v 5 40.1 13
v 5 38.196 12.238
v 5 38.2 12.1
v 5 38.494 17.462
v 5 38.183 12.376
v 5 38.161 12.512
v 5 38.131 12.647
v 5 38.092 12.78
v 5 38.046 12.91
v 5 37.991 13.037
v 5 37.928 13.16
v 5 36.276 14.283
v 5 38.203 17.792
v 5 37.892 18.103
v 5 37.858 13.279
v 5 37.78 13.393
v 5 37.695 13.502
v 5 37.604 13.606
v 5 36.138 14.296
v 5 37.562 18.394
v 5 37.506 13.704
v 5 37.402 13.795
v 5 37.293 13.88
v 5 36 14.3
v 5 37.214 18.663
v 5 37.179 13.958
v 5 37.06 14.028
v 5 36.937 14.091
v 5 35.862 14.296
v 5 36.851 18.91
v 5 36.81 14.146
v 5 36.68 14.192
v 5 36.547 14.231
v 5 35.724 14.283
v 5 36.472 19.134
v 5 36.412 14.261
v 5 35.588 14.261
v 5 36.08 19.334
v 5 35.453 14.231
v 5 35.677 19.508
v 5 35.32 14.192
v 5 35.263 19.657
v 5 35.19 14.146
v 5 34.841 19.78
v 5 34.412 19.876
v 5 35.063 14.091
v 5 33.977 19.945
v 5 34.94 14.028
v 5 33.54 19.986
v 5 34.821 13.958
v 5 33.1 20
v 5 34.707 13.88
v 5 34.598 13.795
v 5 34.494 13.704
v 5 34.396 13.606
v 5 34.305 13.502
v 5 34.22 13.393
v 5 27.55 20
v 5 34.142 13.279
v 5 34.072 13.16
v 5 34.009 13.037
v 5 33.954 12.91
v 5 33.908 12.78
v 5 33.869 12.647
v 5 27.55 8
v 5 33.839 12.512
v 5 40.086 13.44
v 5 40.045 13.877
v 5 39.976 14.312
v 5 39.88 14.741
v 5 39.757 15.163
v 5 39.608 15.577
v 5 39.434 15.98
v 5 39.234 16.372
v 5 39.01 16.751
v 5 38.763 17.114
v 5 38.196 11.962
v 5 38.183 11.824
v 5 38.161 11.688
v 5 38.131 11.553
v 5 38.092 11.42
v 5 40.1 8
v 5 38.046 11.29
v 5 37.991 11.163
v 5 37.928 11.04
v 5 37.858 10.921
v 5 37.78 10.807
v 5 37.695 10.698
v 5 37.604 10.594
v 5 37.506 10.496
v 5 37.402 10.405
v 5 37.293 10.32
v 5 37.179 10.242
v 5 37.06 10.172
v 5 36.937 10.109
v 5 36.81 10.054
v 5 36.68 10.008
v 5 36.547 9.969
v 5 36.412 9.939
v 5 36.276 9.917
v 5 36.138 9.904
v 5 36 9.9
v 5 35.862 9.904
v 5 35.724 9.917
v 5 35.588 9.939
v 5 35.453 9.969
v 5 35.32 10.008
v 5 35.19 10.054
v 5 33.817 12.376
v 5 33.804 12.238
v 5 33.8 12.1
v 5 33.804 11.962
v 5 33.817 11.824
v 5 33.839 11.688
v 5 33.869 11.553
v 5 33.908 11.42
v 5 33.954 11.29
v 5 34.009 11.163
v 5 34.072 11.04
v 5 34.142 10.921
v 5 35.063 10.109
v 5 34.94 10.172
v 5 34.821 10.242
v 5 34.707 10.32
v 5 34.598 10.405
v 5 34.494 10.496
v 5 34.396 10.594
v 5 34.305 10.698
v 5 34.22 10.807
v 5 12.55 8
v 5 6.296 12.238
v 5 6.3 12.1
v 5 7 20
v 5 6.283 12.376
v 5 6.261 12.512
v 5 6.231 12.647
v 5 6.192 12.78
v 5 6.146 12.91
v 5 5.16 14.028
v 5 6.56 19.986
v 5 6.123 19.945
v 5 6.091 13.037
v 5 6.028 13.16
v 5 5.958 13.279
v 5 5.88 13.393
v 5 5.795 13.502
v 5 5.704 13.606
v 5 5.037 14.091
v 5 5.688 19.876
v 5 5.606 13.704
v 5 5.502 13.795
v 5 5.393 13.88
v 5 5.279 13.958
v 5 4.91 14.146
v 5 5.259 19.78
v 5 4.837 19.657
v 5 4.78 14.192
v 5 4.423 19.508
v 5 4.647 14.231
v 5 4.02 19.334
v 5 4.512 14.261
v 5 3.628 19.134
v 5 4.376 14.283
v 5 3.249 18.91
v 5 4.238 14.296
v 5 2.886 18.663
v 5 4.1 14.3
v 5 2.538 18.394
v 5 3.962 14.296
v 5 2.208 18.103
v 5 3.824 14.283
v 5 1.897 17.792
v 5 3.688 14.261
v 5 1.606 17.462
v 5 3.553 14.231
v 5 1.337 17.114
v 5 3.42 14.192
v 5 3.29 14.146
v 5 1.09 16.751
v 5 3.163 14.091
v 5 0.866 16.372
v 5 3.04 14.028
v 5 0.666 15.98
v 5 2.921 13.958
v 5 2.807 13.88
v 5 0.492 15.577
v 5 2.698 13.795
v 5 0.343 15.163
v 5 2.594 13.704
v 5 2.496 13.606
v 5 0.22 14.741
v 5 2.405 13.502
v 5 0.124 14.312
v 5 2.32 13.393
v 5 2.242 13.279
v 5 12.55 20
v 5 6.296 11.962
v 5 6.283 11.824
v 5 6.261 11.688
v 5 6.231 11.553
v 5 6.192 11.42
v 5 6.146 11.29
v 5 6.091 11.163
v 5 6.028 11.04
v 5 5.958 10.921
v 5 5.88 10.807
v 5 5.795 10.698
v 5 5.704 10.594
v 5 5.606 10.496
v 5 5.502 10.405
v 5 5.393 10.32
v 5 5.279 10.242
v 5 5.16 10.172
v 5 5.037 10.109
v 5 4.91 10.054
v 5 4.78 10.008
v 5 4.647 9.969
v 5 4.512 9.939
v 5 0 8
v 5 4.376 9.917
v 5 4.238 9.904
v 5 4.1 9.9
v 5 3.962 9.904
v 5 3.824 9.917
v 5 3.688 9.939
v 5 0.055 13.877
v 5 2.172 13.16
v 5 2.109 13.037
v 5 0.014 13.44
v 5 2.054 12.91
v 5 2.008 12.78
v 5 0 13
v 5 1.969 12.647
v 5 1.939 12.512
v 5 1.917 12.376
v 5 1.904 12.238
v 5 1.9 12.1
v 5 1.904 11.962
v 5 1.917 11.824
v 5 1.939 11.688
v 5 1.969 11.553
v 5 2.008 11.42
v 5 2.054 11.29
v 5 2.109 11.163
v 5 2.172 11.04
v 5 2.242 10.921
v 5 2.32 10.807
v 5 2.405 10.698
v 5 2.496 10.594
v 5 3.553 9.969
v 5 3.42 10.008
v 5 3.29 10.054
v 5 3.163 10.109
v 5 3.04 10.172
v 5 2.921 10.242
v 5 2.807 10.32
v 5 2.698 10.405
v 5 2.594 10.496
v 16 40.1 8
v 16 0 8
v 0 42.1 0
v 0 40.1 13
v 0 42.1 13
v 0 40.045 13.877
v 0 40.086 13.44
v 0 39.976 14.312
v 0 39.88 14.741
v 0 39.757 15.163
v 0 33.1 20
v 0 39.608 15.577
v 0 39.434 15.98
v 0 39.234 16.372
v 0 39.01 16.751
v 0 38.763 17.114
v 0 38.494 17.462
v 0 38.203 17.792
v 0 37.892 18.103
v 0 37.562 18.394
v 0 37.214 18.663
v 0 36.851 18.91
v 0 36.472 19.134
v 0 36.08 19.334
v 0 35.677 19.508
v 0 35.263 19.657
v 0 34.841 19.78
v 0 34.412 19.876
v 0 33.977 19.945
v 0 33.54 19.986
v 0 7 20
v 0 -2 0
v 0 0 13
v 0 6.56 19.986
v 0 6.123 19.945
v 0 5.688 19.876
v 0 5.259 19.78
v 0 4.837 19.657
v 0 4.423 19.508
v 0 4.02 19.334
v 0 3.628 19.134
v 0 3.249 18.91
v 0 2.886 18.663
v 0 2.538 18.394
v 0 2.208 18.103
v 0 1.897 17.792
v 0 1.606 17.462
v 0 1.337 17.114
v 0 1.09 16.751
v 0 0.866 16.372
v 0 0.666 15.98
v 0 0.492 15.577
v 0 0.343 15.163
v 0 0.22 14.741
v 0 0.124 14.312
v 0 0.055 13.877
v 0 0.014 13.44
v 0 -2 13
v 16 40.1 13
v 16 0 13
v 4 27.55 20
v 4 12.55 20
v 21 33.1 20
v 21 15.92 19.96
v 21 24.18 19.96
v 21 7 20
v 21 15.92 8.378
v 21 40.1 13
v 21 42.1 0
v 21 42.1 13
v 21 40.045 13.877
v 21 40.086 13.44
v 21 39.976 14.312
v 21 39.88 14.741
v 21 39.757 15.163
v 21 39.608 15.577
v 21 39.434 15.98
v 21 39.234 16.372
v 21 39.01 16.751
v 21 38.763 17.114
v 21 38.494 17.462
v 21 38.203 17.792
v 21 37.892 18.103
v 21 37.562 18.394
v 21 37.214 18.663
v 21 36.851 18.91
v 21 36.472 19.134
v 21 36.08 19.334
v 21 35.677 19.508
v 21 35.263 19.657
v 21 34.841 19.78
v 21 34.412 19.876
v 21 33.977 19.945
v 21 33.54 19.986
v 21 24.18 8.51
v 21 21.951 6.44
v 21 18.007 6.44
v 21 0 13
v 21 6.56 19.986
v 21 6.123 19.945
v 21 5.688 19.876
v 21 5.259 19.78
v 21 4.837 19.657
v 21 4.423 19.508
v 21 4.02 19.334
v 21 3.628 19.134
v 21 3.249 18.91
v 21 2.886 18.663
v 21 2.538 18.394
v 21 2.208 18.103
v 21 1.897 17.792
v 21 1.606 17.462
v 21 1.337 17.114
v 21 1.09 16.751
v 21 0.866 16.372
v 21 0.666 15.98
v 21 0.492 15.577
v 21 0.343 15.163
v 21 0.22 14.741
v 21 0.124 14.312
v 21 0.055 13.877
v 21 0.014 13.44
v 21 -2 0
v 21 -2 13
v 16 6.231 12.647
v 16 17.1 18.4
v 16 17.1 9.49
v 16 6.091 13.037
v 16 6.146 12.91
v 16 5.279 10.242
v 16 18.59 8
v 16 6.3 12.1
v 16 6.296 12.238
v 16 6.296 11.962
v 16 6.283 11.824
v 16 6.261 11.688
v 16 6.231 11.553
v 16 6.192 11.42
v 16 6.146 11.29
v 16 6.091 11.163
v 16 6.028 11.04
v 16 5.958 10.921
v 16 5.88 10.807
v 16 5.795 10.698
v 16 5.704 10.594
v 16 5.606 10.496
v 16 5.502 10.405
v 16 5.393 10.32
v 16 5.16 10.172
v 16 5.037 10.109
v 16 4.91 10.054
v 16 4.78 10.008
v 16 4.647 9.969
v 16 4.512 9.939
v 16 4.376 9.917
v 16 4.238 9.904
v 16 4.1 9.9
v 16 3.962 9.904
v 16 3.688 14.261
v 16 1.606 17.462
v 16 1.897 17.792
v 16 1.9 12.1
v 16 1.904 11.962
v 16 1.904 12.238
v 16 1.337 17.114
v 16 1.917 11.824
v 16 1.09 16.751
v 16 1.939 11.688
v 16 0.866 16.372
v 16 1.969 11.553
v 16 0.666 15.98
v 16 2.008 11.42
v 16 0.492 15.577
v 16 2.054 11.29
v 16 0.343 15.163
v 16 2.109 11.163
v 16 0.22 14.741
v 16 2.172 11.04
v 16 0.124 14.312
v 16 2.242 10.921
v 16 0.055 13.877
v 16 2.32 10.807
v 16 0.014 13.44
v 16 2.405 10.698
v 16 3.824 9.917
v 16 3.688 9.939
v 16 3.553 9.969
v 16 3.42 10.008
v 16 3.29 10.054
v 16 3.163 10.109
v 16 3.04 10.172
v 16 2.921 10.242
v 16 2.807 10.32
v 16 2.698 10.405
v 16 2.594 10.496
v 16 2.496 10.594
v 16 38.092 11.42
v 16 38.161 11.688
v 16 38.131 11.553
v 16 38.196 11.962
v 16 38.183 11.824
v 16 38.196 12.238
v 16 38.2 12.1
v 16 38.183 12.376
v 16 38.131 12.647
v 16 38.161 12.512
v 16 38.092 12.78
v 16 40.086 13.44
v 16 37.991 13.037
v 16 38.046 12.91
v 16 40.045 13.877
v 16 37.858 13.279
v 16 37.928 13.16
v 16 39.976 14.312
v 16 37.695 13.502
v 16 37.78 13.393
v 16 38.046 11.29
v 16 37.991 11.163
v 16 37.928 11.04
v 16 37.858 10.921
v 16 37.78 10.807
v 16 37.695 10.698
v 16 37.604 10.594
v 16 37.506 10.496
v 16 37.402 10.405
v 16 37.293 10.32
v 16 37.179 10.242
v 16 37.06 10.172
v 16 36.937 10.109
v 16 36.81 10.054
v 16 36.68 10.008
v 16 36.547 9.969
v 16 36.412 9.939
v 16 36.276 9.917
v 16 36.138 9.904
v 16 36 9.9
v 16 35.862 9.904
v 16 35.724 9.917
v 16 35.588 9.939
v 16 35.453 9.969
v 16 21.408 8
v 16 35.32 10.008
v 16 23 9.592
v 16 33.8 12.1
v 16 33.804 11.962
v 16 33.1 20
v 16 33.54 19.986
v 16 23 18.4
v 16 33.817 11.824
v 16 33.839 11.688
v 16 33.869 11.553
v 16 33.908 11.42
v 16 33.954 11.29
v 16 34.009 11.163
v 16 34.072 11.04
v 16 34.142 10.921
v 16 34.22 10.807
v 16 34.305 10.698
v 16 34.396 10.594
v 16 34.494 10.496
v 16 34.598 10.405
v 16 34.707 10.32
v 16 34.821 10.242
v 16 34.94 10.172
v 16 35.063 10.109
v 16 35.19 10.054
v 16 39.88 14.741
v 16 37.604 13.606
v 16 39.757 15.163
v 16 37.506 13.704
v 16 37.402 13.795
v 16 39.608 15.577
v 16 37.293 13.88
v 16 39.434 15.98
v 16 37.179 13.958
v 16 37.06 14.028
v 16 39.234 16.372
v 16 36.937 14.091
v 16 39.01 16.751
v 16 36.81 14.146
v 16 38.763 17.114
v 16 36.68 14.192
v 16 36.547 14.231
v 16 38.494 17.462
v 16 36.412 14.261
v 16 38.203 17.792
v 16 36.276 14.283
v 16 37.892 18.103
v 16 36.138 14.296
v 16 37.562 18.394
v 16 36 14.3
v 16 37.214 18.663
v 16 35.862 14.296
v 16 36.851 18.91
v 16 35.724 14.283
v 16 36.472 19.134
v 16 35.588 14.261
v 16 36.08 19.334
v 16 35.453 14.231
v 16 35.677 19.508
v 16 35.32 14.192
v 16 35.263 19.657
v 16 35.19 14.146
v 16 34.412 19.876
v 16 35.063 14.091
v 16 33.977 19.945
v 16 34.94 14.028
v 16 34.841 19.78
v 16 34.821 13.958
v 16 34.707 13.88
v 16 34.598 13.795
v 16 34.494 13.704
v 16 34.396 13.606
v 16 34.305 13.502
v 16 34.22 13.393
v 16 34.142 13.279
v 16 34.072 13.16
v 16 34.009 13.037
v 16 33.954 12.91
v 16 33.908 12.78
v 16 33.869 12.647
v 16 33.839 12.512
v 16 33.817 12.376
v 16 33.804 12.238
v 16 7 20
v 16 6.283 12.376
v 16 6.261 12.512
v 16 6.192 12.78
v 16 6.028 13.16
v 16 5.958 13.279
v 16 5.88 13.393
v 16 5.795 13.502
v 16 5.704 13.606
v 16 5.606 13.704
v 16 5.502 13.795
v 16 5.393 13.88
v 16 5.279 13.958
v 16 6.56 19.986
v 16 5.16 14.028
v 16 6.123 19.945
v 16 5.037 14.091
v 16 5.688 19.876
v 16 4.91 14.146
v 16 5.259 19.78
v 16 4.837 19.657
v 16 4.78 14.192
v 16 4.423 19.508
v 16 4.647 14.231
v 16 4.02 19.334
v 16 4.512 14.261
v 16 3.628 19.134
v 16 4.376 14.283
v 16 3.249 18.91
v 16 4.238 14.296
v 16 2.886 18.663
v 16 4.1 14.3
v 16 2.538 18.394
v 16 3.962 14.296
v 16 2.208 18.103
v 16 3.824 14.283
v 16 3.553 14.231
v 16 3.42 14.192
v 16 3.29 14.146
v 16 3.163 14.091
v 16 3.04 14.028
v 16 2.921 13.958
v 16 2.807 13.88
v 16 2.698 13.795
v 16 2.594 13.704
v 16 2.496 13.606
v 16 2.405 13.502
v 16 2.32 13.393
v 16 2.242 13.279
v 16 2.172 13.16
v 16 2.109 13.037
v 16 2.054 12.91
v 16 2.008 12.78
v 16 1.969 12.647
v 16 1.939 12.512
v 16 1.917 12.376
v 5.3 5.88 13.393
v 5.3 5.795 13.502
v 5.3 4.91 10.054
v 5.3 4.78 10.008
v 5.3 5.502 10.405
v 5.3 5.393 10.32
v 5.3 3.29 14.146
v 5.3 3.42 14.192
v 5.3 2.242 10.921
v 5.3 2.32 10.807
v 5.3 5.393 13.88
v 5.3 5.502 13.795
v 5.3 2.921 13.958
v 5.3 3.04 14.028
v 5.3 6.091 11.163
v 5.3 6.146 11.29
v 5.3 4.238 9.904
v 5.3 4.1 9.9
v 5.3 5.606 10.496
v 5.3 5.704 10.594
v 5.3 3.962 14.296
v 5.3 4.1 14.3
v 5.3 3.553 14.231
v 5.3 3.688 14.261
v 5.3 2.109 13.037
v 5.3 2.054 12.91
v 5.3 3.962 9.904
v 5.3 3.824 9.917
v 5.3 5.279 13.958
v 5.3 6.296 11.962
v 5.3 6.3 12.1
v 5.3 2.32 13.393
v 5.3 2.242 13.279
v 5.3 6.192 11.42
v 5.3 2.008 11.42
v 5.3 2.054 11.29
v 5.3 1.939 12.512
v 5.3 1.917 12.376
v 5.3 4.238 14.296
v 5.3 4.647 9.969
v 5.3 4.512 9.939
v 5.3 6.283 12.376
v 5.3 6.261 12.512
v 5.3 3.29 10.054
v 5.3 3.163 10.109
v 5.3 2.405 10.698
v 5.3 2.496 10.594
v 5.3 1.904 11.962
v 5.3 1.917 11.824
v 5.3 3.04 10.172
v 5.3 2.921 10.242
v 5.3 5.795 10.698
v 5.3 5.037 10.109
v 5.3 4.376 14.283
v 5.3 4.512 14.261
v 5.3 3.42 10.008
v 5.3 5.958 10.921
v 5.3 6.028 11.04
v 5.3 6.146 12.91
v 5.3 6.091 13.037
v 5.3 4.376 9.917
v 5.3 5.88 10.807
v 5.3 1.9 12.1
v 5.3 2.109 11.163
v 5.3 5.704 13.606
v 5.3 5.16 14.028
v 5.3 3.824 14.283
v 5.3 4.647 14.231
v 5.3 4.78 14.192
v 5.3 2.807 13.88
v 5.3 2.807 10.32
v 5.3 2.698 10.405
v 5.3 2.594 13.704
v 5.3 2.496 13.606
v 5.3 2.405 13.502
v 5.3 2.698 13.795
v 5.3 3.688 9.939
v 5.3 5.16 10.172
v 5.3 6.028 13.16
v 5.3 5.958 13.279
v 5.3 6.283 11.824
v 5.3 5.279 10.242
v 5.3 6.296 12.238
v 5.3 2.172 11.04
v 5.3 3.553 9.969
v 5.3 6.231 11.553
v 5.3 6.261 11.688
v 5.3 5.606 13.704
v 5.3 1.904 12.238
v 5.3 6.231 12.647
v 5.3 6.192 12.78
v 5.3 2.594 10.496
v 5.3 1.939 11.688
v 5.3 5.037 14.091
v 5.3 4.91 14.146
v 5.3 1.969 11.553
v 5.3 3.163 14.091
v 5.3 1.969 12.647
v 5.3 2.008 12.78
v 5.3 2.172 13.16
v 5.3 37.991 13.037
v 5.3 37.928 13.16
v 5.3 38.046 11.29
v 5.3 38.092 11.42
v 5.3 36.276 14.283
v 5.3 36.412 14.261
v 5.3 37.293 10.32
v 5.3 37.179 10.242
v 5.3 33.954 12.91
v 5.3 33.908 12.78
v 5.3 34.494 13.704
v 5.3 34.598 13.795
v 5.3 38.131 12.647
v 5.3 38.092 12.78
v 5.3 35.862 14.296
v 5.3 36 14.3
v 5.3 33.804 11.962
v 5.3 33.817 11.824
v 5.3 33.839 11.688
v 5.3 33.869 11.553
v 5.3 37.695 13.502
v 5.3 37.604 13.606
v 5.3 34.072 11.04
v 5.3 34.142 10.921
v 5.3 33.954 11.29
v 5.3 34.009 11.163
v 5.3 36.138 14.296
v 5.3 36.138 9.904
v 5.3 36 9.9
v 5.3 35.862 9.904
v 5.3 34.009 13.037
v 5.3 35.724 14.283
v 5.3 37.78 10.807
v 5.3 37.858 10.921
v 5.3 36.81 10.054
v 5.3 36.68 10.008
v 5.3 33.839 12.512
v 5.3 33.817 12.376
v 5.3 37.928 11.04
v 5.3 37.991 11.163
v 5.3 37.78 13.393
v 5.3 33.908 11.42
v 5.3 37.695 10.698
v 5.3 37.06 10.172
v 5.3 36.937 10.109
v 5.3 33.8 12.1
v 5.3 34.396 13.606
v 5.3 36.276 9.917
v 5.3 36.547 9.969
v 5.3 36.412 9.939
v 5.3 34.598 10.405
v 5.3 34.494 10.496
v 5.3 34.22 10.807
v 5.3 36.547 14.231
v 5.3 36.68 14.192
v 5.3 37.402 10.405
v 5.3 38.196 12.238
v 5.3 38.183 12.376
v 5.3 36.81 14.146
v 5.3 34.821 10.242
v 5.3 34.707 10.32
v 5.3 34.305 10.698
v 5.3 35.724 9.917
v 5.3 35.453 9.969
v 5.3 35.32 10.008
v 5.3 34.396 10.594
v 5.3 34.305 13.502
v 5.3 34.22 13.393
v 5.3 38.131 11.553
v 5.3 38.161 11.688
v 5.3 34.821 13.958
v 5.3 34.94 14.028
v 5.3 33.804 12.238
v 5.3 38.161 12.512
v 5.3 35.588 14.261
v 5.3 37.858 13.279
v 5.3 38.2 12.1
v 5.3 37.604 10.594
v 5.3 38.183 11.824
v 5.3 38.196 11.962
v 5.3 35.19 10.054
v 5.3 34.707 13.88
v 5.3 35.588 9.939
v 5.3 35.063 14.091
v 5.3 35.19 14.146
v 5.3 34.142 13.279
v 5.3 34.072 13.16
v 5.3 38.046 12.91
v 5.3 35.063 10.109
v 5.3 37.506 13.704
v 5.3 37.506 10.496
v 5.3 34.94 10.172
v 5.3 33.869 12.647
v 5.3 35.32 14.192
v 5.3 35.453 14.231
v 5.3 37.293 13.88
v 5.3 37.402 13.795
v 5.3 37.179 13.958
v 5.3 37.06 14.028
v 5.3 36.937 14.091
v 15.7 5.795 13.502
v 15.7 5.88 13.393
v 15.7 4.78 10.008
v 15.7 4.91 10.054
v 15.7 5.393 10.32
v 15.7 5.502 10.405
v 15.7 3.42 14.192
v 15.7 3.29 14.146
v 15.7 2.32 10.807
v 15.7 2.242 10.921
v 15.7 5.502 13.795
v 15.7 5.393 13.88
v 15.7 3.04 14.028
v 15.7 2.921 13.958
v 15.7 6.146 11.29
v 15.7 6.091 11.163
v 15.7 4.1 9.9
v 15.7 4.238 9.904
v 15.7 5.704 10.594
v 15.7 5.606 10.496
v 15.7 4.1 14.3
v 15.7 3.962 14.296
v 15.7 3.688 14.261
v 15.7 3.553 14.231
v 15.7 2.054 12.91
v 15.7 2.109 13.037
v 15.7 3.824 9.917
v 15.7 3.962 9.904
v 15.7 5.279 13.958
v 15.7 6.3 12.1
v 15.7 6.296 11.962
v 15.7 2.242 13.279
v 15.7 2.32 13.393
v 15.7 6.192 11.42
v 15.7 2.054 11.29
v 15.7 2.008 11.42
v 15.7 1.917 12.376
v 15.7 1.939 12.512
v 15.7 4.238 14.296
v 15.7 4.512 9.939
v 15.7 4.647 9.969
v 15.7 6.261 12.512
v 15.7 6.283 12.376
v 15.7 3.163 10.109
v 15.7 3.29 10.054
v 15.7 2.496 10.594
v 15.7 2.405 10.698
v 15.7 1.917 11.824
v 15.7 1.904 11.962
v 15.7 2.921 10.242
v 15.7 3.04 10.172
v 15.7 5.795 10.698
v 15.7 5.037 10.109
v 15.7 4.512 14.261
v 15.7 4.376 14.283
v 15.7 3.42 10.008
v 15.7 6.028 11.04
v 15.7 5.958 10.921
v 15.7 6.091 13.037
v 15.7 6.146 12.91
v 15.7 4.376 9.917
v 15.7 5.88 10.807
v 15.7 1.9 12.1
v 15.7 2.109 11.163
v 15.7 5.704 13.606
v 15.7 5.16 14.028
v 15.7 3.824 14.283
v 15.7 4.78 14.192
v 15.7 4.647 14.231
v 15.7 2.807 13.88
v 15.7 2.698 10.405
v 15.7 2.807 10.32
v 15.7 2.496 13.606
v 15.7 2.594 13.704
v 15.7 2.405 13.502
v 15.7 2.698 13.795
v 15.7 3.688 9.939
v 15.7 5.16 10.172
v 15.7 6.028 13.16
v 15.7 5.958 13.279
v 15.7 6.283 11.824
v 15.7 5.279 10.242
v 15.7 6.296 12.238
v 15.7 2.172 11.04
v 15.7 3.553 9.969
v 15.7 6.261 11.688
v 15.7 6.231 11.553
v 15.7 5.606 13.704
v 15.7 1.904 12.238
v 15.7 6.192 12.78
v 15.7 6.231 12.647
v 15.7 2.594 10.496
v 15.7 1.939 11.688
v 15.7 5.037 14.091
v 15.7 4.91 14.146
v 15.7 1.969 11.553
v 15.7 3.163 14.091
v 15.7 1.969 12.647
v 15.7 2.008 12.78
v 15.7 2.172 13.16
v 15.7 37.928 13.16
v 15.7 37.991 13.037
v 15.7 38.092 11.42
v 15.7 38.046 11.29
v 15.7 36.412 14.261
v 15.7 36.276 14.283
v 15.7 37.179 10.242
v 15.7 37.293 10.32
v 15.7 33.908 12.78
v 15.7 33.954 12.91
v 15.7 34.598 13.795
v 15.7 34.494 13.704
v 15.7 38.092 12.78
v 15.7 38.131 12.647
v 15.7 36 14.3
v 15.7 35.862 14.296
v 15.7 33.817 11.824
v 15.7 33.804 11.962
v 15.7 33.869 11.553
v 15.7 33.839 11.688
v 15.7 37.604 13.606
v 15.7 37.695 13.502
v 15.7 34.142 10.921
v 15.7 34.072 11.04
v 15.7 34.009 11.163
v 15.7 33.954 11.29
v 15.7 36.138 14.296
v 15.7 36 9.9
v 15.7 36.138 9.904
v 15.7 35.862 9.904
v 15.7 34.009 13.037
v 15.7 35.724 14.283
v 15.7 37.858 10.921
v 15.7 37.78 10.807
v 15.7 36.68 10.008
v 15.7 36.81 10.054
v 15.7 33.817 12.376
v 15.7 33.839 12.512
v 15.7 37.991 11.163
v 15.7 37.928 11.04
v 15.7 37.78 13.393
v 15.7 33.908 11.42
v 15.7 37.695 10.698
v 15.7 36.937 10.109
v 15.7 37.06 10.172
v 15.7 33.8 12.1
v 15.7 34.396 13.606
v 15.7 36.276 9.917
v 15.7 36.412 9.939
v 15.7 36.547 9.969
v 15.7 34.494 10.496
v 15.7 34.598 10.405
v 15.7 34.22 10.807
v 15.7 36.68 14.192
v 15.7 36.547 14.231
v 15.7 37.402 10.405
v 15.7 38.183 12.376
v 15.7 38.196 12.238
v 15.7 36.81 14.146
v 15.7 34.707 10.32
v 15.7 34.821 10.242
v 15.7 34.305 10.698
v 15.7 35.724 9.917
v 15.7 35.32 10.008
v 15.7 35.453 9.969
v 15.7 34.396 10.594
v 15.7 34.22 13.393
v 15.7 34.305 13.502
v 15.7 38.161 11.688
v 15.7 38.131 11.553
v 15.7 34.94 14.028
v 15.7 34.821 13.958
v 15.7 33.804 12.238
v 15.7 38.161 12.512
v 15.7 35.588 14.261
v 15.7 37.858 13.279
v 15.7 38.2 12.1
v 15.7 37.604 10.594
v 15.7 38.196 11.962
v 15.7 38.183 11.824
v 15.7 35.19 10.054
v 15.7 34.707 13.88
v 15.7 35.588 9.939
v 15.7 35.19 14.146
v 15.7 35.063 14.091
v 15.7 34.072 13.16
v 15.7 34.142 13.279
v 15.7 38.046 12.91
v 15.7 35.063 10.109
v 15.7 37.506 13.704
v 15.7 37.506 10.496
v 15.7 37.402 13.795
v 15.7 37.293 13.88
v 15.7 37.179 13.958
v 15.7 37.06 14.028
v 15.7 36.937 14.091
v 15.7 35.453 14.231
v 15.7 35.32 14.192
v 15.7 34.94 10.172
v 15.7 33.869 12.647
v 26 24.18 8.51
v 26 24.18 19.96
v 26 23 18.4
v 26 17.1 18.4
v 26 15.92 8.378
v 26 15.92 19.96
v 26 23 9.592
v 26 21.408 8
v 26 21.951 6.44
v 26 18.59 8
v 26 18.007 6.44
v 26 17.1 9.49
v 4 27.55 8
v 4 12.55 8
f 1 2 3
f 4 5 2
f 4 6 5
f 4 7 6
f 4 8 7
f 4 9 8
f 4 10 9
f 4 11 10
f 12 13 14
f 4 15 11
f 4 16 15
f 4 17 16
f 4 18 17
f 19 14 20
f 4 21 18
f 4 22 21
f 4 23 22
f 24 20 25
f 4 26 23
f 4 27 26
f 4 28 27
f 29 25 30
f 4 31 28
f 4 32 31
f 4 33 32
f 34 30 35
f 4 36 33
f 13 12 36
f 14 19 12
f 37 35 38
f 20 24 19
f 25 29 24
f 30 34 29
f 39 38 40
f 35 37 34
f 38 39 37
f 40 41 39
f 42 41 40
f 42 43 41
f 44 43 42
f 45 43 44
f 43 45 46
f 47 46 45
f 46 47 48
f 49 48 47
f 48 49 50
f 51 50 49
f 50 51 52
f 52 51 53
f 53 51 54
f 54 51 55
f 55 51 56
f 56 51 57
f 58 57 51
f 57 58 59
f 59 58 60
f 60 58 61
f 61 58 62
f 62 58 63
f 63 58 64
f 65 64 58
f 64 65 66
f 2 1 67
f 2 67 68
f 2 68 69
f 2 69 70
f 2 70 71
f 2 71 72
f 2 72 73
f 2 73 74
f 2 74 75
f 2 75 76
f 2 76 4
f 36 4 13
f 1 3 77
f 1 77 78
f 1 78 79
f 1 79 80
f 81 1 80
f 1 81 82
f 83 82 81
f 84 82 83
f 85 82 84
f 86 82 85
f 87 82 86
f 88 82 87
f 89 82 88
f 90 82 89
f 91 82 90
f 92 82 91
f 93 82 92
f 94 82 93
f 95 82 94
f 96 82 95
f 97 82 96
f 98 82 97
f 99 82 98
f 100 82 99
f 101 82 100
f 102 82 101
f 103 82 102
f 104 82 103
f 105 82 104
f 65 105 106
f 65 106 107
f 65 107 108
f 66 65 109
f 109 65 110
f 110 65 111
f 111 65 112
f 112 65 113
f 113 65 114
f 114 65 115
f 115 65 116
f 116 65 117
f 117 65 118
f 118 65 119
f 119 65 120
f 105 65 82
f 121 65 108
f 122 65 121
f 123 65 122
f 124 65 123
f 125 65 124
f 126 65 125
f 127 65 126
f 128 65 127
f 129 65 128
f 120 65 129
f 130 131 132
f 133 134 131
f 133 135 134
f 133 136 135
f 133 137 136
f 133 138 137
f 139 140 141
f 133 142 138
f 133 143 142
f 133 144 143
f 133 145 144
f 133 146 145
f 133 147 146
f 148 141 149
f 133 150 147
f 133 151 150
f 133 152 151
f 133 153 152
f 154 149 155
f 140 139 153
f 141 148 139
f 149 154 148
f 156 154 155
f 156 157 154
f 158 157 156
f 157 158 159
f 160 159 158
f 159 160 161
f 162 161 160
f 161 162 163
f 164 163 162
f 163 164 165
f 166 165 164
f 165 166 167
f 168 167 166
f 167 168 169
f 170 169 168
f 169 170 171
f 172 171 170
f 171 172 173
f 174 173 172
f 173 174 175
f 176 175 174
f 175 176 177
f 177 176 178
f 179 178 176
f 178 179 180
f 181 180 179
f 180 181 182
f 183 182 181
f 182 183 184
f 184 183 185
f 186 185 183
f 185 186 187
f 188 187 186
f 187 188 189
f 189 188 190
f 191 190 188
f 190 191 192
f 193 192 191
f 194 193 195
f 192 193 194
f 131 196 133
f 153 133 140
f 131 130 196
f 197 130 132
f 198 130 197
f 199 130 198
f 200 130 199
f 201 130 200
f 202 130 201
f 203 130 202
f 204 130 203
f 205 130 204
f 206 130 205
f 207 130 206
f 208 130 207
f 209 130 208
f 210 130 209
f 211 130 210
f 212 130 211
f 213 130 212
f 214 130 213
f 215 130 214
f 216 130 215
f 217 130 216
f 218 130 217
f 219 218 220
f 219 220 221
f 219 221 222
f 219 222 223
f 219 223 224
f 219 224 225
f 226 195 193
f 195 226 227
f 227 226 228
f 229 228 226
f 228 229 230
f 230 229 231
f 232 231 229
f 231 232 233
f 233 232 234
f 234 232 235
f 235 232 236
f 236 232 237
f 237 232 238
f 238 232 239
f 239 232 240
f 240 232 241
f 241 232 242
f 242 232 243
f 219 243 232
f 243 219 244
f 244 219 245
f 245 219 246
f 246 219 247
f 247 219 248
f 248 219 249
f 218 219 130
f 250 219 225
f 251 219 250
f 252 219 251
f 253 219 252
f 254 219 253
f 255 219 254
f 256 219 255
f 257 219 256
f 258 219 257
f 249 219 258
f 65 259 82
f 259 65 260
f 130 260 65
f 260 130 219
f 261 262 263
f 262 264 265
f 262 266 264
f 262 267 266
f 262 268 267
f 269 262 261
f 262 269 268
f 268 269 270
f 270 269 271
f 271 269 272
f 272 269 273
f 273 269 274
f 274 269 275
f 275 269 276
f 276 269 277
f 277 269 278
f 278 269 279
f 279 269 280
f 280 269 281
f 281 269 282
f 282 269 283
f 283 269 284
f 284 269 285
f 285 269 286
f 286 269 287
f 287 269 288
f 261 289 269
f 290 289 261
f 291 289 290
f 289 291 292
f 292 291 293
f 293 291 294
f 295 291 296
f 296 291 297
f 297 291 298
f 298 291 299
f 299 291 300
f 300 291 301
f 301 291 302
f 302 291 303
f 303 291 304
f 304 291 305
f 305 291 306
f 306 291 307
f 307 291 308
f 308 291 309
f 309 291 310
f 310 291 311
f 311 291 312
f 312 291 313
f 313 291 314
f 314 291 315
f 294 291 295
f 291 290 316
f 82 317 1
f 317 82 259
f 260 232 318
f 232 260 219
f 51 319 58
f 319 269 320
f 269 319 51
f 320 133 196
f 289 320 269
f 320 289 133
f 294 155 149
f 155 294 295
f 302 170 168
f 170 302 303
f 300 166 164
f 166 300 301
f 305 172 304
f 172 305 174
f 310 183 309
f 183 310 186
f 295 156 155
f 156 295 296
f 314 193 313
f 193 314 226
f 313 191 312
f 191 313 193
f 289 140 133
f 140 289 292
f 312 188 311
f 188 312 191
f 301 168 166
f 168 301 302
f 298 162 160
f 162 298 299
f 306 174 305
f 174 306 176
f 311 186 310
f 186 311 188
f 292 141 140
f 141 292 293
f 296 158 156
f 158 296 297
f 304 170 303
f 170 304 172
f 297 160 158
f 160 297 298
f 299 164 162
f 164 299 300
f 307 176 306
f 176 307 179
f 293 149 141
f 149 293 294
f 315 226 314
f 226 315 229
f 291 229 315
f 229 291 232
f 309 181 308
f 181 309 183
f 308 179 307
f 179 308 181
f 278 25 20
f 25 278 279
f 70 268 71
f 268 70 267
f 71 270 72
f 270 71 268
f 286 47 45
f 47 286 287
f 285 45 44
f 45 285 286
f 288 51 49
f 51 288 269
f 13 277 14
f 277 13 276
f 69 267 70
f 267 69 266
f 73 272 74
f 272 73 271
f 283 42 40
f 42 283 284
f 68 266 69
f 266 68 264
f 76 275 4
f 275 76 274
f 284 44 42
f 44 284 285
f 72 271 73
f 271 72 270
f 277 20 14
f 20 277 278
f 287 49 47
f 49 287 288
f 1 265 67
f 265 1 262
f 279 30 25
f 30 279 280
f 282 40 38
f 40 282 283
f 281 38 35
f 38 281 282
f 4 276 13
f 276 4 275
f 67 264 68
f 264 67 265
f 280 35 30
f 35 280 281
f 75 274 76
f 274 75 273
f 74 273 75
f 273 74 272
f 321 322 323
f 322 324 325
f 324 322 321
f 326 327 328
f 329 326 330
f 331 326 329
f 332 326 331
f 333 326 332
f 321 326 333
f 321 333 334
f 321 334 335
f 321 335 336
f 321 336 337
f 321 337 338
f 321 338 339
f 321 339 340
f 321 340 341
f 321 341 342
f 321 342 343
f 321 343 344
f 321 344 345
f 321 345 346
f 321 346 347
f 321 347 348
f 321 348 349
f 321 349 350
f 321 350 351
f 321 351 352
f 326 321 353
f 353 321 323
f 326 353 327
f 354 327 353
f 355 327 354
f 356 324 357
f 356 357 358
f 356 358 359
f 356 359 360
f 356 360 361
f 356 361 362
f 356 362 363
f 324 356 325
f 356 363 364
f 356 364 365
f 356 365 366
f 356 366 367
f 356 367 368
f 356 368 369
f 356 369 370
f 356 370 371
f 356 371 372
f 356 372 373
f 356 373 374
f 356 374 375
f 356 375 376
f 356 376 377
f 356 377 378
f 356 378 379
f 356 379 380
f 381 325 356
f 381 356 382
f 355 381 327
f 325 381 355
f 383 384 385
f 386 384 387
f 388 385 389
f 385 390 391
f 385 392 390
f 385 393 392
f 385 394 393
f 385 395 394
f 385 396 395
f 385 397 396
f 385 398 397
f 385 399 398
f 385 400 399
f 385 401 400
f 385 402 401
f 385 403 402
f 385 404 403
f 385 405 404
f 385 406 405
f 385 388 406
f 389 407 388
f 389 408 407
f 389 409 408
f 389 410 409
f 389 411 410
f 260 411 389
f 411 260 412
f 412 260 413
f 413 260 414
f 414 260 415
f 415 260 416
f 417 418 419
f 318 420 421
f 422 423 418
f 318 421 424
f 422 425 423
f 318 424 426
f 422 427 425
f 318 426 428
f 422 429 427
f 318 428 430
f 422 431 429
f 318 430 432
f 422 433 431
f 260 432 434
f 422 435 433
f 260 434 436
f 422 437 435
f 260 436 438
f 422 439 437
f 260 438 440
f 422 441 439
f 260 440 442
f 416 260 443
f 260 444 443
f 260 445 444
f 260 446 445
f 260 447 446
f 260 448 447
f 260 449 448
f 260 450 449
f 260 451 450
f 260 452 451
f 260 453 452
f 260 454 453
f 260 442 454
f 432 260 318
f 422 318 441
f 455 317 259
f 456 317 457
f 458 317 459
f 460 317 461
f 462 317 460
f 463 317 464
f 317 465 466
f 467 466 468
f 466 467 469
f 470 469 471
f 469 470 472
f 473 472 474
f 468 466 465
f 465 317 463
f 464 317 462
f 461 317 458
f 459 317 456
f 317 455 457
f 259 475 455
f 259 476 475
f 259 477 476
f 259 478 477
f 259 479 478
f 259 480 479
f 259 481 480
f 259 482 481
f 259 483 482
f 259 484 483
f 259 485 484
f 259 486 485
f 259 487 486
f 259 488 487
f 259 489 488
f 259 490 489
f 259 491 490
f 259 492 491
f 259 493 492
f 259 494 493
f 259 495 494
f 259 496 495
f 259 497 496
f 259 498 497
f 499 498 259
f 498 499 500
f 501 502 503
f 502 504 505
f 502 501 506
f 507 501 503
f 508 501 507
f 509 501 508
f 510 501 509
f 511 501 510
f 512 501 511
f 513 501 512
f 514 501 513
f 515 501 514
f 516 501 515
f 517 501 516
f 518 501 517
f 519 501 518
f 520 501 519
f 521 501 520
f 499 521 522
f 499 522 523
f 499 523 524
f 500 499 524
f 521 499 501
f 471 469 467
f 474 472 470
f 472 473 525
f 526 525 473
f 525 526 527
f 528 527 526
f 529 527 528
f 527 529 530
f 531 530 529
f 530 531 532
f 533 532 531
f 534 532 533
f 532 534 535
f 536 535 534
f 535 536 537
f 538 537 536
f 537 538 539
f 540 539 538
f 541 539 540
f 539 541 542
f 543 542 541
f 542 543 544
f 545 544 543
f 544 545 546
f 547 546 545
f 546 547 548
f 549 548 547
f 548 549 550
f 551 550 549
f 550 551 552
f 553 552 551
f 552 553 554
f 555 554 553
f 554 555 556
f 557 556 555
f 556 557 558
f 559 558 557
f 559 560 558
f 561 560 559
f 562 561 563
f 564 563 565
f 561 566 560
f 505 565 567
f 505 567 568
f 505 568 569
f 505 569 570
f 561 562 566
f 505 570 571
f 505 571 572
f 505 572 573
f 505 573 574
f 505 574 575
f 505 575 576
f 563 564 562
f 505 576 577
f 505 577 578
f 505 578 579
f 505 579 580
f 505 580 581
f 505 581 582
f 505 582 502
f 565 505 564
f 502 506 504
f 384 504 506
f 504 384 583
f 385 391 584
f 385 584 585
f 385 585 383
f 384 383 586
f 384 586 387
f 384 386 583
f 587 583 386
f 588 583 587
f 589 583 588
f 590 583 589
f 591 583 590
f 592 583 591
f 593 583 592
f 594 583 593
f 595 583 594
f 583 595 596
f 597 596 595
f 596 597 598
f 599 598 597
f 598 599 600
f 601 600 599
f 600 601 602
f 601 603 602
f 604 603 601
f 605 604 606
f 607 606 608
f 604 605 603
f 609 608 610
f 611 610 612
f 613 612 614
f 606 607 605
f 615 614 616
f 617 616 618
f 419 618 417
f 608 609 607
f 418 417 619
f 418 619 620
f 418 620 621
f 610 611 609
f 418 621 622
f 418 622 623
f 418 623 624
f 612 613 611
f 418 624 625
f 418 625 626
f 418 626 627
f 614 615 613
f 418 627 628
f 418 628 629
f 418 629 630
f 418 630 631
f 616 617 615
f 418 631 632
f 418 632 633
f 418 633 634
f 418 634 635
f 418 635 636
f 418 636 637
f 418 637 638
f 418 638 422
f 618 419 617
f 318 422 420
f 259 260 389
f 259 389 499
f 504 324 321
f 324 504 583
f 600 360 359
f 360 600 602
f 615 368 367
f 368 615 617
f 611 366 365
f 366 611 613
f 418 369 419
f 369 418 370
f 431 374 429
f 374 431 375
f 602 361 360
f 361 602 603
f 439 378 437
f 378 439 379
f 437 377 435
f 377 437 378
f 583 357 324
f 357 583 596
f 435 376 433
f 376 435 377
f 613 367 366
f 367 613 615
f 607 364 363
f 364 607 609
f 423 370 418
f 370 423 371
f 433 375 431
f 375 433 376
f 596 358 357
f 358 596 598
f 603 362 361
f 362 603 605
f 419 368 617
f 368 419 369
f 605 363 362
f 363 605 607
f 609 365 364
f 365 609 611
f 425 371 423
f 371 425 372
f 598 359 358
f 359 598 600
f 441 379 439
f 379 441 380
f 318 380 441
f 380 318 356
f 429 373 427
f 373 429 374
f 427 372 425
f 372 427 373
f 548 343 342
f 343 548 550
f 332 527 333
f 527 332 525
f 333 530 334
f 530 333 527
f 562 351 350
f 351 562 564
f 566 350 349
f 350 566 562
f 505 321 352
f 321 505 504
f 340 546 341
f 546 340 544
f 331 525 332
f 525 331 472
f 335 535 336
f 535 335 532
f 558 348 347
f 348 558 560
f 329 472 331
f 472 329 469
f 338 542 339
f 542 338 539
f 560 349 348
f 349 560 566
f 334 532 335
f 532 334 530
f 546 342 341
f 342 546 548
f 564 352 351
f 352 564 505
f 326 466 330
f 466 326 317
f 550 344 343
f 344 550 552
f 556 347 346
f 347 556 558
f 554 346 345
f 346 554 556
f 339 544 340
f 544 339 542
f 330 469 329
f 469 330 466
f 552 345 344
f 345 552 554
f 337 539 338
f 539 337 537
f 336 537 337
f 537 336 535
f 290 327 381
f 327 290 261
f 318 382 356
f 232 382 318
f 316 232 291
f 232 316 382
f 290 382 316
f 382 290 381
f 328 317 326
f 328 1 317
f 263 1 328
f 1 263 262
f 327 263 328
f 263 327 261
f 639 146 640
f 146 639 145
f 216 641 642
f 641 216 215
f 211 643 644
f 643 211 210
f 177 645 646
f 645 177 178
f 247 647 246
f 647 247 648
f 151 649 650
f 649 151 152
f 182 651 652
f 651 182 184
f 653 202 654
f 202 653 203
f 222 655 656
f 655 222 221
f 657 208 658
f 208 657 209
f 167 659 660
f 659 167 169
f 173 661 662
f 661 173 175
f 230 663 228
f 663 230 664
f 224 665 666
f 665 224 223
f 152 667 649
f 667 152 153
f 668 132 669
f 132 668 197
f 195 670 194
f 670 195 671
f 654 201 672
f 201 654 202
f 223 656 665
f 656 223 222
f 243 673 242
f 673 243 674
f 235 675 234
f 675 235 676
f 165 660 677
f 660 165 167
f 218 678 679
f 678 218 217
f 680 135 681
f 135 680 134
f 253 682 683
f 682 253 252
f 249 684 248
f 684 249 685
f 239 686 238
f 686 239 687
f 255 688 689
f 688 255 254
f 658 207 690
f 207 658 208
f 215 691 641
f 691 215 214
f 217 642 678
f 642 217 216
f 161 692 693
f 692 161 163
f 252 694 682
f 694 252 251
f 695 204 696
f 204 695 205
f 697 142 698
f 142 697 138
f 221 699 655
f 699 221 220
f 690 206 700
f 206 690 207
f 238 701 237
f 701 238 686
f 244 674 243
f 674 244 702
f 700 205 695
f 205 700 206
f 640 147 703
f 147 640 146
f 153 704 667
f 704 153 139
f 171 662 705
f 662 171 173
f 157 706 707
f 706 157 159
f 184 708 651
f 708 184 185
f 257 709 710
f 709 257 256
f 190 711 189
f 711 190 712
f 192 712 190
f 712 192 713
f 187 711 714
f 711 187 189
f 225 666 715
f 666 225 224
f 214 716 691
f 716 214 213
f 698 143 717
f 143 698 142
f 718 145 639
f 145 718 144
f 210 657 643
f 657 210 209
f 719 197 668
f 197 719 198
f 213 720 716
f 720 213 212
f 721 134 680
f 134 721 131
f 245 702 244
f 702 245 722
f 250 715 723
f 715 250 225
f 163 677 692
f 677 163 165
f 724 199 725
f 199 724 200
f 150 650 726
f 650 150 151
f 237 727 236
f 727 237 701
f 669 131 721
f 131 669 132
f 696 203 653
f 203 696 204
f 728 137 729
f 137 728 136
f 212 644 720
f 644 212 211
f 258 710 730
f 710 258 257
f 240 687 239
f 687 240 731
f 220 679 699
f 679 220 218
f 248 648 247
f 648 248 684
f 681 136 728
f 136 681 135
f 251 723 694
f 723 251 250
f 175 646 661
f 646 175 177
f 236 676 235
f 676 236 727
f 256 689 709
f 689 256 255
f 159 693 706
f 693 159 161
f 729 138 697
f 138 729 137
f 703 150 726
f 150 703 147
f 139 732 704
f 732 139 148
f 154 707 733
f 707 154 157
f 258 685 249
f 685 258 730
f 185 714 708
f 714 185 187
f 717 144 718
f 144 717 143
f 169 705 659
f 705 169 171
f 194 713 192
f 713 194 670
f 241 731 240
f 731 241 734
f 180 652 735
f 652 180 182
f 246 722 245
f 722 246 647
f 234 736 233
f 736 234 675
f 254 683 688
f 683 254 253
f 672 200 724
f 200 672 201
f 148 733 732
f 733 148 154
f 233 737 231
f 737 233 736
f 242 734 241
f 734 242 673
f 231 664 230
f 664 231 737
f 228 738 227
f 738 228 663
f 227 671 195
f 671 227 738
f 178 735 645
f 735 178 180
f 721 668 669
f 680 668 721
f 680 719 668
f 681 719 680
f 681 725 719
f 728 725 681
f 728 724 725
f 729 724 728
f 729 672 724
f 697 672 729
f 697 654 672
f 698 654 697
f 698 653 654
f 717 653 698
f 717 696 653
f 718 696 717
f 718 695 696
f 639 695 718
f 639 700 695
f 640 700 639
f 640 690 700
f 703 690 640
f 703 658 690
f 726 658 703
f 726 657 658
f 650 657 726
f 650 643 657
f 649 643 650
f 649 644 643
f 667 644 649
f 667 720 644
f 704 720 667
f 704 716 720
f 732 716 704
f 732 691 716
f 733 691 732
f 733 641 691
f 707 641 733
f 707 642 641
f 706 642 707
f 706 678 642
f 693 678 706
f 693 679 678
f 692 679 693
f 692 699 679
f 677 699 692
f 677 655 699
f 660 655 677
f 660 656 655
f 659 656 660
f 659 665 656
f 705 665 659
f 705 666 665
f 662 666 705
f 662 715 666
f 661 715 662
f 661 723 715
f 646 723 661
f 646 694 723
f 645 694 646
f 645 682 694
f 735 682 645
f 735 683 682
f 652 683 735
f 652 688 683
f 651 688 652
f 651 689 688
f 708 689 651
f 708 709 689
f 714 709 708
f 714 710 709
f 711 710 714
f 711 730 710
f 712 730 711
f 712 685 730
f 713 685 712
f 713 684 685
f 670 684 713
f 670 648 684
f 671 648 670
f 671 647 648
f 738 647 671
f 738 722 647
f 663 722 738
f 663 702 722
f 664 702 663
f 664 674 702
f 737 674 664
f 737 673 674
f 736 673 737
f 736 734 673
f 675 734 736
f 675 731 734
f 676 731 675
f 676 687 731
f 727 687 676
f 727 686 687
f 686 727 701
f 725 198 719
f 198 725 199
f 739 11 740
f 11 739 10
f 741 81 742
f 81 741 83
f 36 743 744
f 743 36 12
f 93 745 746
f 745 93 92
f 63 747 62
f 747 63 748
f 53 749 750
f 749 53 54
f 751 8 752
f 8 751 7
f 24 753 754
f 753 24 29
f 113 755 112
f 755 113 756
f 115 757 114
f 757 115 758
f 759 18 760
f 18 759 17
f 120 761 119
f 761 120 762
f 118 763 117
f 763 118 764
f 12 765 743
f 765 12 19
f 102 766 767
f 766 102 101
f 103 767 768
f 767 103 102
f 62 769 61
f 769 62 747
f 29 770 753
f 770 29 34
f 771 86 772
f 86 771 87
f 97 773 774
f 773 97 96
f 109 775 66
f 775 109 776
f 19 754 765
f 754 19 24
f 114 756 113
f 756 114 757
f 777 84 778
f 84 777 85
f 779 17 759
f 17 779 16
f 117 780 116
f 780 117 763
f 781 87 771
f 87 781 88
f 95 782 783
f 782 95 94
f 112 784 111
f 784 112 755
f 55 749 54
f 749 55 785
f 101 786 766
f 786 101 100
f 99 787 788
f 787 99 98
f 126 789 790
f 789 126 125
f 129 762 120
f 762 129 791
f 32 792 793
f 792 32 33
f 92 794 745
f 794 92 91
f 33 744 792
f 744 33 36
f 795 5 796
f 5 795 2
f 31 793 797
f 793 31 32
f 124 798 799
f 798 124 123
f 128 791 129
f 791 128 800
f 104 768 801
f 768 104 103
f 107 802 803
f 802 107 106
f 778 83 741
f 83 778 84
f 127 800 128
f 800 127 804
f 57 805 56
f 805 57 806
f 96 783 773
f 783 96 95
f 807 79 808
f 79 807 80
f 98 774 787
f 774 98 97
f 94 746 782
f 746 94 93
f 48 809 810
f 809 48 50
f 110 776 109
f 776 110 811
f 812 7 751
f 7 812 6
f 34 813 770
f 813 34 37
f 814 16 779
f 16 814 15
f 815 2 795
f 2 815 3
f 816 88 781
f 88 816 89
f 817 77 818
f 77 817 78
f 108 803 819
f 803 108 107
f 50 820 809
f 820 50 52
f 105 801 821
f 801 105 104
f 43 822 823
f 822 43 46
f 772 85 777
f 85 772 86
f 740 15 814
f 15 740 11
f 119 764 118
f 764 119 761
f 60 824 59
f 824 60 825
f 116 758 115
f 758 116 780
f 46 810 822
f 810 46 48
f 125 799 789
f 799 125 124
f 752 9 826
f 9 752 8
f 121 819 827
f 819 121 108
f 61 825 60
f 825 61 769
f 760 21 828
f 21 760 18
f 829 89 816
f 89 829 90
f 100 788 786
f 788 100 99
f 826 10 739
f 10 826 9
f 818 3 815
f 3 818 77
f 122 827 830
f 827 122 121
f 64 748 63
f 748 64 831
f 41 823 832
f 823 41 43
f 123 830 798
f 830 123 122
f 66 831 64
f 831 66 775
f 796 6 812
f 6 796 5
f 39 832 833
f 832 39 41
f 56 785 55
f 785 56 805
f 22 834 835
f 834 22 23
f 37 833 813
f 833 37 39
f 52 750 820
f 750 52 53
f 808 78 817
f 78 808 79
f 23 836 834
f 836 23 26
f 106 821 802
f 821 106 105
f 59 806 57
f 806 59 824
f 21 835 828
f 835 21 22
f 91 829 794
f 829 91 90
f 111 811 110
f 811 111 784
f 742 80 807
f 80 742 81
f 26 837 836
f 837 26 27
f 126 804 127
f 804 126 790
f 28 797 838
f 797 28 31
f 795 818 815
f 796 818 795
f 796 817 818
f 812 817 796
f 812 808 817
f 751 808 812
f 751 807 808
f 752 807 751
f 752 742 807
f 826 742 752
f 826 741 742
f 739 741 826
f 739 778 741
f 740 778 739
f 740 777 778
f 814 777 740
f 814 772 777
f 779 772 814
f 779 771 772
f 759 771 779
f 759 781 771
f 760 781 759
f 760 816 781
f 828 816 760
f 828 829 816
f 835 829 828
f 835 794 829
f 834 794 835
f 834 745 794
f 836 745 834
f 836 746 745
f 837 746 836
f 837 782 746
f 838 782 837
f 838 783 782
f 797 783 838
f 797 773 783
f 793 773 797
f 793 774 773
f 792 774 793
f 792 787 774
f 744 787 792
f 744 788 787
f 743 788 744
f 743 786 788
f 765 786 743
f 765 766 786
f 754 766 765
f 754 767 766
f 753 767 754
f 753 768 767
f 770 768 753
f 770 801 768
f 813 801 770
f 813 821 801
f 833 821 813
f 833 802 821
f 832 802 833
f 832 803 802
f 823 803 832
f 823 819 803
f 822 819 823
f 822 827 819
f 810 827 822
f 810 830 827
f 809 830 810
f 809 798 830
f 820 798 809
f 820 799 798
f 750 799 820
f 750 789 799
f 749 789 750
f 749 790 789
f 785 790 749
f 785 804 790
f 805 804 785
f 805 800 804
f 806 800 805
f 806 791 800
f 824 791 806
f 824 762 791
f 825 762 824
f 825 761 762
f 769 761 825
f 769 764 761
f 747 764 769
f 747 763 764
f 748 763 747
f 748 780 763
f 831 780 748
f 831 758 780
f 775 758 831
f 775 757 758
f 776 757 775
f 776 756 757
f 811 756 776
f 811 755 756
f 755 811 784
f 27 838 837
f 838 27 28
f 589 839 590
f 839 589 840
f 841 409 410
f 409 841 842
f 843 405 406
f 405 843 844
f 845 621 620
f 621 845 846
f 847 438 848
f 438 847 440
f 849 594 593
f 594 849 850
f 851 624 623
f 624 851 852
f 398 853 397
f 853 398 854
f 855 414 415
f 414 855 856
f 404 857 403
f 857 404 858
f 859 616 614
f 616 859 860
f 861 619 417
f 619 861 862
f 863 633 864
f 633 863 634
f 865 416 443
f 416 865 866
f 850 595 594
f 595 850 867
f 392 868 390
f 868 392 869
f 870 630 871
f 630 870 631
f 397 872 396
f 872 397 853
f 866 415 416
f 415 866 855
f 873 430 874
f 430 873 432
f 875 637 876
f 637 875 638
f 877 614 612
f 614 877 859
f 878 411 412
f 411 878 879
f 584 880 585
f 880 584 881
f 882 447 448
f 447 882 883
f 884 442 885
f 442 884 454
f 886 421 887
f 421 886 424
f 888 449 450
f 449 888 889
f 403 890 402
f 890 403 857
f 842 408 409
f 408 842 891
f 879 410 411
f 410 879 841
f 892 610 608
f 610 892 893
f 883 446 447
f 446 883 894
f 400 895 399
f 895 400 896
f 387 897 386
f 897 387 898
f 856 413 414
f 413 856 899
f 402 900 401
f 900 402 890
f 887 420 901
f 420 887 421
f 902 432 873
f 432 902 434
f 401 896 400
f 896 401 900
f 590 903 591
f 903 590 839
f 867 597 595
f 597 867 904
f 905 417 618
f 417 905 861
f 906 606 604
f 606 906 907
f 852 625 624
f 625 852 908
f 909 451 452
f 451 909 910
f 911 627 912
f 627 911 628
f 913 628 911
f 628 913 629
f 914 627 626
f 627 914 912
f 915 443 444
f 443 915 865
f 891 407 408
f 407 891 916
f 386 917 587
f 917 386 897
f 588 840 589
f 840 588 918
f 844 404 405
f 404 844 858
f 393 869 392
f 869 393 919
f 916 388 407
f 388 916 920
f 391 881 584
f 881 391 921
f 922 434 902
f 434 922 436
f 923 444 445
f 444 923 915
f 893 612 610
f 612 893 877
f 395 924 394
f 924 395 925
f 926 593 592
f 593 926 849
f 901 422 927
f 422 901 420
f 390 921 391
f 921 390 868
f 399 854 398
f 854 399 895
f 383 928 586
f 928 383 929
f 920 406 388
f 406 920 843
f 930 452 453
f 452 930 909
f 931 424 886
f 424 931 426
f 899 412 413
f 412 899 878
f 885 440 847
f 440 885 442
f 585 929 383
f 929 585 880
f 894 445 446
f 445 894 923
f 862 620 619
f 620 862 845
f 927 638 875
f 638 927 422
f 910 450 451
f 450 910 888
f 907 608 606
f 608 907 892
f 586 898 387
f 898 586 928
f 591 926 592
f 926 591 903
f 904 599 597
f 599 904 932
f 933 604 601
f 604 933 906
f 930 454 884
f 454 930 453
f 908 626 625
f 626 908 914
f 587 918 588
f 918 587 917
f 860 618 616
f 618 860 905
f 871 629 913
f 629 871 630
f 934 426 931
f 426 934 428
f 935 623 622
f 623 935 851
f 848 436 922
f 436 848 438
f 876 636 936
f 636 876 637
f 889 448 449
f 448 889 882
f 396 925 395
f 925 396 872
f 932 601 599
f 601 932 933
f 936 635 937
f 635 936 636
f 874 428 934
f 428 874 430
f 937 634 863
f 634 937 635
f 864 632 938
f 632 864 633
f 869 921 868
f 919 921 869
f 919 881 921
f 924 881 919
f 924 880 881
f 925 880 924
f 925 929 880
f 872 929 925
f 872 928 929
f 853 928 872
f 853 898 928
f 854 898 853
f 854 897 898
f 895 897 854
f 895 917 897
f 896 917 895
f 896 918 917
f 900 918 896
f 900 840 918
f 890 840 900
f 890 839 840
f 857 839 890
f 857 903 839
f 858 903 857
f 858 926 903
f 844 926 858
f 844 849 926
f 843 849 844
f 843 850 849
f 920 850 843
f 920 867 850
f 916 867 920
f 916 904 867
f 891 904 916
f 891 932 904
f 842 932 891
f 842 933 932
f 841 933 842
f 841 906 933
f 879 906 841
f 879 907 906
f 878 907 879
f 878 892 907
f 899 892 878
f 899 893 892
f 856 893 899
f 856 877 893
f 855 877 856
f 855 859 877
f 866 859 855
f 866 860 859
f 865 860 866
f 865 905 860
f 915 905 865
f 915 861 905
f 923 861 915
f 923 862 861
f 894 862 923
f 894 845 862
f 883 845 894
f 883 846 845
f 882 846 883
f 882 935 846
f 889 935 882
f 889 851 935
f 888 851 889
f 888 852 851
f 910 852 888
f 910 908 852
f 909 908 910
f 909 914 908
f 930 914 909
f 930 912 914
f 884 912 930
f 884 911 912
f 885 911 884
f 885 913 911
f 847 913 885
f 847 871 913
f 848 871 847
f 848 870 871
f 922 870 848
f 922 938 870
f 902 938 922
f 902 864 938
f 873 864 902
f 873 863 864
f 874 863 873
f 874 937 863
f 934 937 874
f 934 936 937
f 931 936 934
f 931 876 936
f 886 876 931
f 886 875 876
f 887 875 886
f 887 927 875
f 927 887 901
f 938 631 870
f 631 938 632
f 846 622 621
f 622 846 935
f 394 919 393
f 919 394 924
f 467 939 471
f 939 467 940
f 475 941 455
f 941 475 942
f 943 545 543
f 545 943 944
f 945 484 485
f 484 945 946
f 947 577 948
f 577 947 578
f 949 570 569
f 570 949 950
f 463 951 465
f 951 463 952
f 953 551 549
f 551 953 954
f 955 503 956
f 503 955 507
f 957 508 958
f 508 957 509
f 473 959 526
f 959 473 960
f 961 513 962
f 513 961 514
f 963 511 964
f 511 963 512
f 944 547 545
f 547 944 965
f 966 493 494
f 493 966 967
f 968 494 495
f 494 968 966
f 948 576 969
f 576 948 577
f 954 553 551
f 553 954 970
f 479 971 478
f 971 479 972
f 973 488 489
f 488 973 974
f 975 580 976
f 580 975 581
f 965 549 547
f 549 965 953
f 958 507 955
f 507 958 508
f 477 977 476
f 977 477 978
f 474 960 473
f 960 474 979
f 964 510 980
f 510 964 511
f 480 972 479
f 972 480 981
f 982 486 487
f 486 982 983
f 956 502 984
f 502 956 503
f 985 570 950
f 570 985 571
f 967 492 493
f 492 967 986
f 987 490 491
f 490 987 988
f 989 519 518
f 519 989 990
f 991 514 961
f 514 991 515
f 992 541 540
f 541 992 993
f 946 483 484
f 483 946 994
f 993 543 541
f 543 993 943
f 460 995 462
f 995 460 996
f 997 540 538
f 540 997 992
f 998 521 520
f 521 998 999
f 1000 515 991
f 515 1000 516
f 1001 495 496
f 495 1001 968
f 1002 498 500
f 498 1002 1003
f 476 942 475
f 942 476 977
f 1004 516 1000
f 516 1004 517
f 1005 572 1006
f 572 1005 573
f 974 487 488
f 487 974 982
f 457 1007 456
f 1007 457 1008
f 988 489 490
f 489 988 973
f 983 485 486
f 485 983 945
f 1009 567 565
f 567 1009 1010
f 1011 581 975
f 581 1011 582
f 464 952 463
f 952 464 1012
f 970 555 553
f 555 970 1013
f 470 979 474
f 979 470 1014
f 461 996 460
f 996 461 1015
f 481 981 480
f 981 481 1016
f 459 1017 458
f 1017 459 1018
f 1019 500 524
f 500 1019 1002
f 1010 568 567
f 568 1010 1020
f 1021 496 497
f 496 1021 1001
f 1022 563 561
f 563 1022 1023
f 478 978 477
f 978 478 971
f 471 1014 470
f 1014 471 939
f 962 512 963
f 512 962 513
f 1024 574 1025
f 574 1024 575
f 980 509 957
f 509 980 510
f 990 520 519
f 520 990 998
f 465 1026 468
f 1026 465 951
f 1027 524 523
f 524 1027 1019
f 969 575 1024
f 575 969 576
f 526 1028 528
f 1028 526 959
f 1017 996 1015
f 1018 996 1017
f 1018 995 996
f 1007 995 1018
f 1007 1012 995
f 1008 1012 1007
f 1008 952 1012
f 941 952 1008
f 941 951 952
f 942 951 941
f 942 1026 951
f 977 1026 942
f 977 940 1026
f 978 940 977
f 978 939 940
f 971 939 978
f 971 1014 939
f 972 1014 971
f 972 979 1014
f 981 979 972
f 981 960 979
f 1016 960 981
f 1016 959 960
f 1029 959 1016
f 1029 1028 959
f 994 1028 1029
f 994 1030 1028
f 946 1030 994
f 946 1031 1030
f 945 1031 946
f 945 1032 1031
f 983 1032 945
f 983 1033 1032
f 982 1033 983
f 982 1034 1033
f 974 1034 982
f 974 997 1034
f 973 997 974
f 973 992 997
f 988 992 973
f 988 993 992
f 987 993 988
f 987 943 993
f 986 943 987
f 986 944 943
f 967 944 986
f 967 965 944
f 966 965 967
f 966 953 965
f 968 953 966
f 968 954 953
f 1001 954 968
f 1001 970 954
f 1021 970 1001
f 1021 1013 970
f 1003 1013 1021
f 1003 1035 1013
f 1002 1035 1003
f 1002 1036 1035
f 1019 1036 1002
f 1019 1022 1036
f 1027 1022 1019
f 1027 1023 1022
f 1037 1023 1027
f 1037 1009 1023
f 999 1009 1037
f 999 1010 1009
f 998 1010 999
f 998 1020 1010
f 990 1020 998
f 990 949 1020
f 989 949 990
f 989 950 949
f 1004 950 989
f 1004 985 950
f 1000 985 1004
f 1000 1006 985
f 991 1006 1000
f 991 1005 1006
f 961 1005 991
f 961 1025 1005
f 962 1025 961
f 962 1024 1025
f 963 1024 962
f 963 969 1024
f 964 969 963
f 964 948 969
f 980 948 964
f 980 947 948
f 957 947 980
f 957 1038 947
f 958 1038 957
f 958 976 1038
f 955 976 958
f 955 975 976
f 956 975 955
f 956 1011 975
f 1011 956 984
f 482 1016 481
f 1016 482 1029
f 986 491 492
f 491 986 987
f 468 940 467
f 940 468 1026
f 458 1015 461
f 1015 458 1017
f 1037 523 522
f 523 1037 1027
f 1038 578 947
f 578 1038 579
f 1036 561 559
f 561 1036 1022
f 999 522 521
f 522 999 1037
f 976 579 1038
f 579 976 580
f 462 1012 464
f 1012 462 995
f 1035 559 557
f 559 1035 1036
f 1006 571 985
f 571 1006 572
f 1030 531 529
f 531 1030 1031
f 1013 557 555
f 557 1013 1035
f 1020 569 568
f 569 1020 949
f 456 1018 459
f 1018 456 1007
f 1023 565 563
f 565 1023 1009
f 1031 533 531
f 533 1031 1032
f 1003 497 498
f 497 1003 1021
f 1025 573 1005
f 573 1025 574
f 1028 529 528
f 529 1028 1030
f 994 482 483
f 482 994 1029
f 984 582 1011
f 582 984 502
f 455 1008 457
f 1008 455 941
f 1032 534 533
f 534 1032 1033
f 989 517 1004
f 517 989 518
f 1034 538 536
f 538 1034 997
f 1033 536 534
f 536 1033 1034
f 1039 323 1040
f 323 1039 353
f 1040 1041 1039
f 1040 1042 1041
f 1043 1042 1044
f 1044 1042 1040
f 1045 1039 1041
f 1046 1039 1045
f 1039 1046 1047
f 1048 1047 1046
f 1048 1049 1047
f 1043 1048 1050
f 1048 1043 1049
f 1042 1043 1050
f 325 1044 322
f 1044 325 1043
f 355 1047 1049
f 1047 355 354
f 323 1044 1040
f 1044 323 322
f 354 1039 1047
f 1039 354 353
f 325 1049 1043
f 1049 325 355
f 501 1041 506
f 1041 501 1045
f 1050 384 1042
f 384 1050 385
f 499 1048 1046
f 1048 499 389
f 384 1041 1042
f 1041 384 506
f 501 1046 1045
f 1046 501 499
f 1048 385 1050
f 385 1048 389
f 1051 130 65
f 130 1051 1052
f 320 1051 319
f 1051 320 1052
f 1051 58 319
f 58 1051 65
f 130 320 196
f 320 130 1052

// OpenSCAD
// Drehzahlmesser-Gehäuse V2 2021-06-04
// jetzt für Reflexionslichtschranke mit Treibergedöns

// Angaben sind in mm

// gedruckt mit 0.2 und 60%

$fn = $preview ? 20 : 100;

// Breite der Halterung, Höhe der Wände
breite = 40.1;
hoehe = 12;

// Boden und Wand links/rechts
bodendicke = 8;
wandstaerke = 5;

// Seitenwände links und rechts (grün)
Seitenwandstaerke = 2;
Seitenwandueberstand = 5;

// Breite der Bucht und Rundungsradius
abstand = 11;
rundung = 7;

// Tiefe der Minihaltegnubbel (Rot)
Gnubtiefe = 0.3;
Gnubabstand = 2.2+1.9;
Gnubhoehe = 1.9;
Gnubdurchmesser = 4.4;

// ==================================================
// Aufbau der Objekte
boden=[2*wandstaerke+abstand,breite,bodendicke];
// Wand steht links/rechts bündig zum Boden
wand=[wandstaerke,breite,hoehe];

// Lichtschrankengehäuse
lsmargin = 0.1;
lsbreite = 5.8+lsmargin;
lsfront = 2.5+lsmargin;
lshoehe = 10.3+lsmargin;
lstiefe = 20.0; // egal.

// zwei verschiedene TCRT5000-Lichtschrankenmodule
// 0: 3-Pin-Connector mit auf PCB aufliegendem TCRT5000-Modul
// 3: 4-Pin-Connector mit auf PCB stehendem TCRT5000-Modul
lsofs = 3;

// Spiegelfläche
// Haushaltsalufolie einkleben
spbreite = 15.0;

//**************************************************************
// Zusammenbau der Teile
/**/
difference () {
    union() {
        gehaeuse();
        
        // Rand um Lichtschrankenloch
        translate([25-2+lsofs,breite/2.0,hoehe+1.2])
        rotate([-90,0,90])
        scale([1.4,1.3,0.3])
        lichtschranke();
    }

    // bodenplatte wg. durchstossenden Rundungen
    translate([-50,-50,-10])
    cube([100,100,10]);

    // Lichtschrankenloch
    translate([29,breite/2.0,hoehe+1.2])
    rotate([-90,0,90])
    lichtschranke();
    
    // Spiegelfläche
    translate([wandstaerke-1,(breite-spbreite)/2.0,bodendicke])
    cube([1,spbreite,20]);
}    
/**/

//**************************************************************
// linke und rechte Wand anfügen
module gehaeuse() {
    union() {
        // Basisplatte
        cube(boden);

        translate([0,0,boden[2]]) 
        rrect(wand,rundung);
        translate([boden[0]-wand[0],0,boden[2]]) 
        rrect(wand,rundung);
        
        // Seitenwände
        color("green")
        translate([0,-Seitenwandstaerke,0])
        cube([2*wandstaerke+abstand,Seitenwandstaerke,bodendicke+Seitenwandueberstand]);
        
        color("green")
        translate([0,breite,0])
        cube([2*wandstaerke+abstand,Seitenwandstaerke,bodendicke+Seitenwandueberstand]);
        
        // 4 Haltegnubbel für die Lüfterlöcher        
        color("red")
        translate([wandstaerke,Gnubabstand,bodendicke+Gnubdurchmesser/2+Gnubhoehe])
        rotate ([0,90,0])
        cylinder(h=Gnubtiefe,d=Gnubdurchmesser);
        
        color("red")
        translate([wandstaerke,breite-Gnubabstand,bodendicke+Gnubdurchmesser/2+Gnubhoehe])
        rotate ([0,90,0])
        cylinder(h=Gnubtiefe,d=Gnubdurchmesser);
        
        color("red")
        translate([wandstaerke+abstand-Gnubtiefe,Gnubabstand,bodendicke+Gnubdurchmesser/2+Gnubhoehe])
        rotate ([0,90,0])
        cylinder(h=Gnubtiefe,d=Gnubdurchmesser);
        
        color("red")
        translate([wandstaerke+abstand-Gnubtiefe,breite-Gnubabstand,bodendicke+Gnubdurchmesser/2+Gnubhoehe])
        rotate ([0,90,0])
        cylinder(h=Gnubtiefe,d=Gnubdurchmesser);
    };
}

//**************************************************************
module lichtschranke() {
    translate([-lsbreite/2.0,-lshoehe/2.0,0])
    difference() {    
        cube([lsbreite,lshoehe,lstiefe]);
        
        // furchtbares Ausprobieren.... gewinnt gar keine Preise....
        color("red")
        rotate([0,0,45])
        translate([lshoehe-0.0,1.9,0])
        cube([1.4,2.5,lstiefe]);
        
        color("blue")
        rotate([0,0,45])
        translate([lshoehe-4.1,5.9+0.4,0])
        cube([2.3,1.4,lstiefe]);
    }    
}

//=================================================================
module rrect(size, radius)
{
    union() {
        cube([size[0],size[1],size[2]-radius]);
        
        translate([0,radius,size[2]-radius]) 
        cube([size[0],size[1]-2*radius,radius]);
        
        translate([0,radius,size[2]-radius]) 
        rotate ([0,90,0]) 
        cylinder(h=size[0],r=radius );
        
        translate([0,size[1]-radius,size[2]-radius]) 
        rotate ([0,90,0]) 
        cylinder(h=size[0],r=radius);
   }
}
